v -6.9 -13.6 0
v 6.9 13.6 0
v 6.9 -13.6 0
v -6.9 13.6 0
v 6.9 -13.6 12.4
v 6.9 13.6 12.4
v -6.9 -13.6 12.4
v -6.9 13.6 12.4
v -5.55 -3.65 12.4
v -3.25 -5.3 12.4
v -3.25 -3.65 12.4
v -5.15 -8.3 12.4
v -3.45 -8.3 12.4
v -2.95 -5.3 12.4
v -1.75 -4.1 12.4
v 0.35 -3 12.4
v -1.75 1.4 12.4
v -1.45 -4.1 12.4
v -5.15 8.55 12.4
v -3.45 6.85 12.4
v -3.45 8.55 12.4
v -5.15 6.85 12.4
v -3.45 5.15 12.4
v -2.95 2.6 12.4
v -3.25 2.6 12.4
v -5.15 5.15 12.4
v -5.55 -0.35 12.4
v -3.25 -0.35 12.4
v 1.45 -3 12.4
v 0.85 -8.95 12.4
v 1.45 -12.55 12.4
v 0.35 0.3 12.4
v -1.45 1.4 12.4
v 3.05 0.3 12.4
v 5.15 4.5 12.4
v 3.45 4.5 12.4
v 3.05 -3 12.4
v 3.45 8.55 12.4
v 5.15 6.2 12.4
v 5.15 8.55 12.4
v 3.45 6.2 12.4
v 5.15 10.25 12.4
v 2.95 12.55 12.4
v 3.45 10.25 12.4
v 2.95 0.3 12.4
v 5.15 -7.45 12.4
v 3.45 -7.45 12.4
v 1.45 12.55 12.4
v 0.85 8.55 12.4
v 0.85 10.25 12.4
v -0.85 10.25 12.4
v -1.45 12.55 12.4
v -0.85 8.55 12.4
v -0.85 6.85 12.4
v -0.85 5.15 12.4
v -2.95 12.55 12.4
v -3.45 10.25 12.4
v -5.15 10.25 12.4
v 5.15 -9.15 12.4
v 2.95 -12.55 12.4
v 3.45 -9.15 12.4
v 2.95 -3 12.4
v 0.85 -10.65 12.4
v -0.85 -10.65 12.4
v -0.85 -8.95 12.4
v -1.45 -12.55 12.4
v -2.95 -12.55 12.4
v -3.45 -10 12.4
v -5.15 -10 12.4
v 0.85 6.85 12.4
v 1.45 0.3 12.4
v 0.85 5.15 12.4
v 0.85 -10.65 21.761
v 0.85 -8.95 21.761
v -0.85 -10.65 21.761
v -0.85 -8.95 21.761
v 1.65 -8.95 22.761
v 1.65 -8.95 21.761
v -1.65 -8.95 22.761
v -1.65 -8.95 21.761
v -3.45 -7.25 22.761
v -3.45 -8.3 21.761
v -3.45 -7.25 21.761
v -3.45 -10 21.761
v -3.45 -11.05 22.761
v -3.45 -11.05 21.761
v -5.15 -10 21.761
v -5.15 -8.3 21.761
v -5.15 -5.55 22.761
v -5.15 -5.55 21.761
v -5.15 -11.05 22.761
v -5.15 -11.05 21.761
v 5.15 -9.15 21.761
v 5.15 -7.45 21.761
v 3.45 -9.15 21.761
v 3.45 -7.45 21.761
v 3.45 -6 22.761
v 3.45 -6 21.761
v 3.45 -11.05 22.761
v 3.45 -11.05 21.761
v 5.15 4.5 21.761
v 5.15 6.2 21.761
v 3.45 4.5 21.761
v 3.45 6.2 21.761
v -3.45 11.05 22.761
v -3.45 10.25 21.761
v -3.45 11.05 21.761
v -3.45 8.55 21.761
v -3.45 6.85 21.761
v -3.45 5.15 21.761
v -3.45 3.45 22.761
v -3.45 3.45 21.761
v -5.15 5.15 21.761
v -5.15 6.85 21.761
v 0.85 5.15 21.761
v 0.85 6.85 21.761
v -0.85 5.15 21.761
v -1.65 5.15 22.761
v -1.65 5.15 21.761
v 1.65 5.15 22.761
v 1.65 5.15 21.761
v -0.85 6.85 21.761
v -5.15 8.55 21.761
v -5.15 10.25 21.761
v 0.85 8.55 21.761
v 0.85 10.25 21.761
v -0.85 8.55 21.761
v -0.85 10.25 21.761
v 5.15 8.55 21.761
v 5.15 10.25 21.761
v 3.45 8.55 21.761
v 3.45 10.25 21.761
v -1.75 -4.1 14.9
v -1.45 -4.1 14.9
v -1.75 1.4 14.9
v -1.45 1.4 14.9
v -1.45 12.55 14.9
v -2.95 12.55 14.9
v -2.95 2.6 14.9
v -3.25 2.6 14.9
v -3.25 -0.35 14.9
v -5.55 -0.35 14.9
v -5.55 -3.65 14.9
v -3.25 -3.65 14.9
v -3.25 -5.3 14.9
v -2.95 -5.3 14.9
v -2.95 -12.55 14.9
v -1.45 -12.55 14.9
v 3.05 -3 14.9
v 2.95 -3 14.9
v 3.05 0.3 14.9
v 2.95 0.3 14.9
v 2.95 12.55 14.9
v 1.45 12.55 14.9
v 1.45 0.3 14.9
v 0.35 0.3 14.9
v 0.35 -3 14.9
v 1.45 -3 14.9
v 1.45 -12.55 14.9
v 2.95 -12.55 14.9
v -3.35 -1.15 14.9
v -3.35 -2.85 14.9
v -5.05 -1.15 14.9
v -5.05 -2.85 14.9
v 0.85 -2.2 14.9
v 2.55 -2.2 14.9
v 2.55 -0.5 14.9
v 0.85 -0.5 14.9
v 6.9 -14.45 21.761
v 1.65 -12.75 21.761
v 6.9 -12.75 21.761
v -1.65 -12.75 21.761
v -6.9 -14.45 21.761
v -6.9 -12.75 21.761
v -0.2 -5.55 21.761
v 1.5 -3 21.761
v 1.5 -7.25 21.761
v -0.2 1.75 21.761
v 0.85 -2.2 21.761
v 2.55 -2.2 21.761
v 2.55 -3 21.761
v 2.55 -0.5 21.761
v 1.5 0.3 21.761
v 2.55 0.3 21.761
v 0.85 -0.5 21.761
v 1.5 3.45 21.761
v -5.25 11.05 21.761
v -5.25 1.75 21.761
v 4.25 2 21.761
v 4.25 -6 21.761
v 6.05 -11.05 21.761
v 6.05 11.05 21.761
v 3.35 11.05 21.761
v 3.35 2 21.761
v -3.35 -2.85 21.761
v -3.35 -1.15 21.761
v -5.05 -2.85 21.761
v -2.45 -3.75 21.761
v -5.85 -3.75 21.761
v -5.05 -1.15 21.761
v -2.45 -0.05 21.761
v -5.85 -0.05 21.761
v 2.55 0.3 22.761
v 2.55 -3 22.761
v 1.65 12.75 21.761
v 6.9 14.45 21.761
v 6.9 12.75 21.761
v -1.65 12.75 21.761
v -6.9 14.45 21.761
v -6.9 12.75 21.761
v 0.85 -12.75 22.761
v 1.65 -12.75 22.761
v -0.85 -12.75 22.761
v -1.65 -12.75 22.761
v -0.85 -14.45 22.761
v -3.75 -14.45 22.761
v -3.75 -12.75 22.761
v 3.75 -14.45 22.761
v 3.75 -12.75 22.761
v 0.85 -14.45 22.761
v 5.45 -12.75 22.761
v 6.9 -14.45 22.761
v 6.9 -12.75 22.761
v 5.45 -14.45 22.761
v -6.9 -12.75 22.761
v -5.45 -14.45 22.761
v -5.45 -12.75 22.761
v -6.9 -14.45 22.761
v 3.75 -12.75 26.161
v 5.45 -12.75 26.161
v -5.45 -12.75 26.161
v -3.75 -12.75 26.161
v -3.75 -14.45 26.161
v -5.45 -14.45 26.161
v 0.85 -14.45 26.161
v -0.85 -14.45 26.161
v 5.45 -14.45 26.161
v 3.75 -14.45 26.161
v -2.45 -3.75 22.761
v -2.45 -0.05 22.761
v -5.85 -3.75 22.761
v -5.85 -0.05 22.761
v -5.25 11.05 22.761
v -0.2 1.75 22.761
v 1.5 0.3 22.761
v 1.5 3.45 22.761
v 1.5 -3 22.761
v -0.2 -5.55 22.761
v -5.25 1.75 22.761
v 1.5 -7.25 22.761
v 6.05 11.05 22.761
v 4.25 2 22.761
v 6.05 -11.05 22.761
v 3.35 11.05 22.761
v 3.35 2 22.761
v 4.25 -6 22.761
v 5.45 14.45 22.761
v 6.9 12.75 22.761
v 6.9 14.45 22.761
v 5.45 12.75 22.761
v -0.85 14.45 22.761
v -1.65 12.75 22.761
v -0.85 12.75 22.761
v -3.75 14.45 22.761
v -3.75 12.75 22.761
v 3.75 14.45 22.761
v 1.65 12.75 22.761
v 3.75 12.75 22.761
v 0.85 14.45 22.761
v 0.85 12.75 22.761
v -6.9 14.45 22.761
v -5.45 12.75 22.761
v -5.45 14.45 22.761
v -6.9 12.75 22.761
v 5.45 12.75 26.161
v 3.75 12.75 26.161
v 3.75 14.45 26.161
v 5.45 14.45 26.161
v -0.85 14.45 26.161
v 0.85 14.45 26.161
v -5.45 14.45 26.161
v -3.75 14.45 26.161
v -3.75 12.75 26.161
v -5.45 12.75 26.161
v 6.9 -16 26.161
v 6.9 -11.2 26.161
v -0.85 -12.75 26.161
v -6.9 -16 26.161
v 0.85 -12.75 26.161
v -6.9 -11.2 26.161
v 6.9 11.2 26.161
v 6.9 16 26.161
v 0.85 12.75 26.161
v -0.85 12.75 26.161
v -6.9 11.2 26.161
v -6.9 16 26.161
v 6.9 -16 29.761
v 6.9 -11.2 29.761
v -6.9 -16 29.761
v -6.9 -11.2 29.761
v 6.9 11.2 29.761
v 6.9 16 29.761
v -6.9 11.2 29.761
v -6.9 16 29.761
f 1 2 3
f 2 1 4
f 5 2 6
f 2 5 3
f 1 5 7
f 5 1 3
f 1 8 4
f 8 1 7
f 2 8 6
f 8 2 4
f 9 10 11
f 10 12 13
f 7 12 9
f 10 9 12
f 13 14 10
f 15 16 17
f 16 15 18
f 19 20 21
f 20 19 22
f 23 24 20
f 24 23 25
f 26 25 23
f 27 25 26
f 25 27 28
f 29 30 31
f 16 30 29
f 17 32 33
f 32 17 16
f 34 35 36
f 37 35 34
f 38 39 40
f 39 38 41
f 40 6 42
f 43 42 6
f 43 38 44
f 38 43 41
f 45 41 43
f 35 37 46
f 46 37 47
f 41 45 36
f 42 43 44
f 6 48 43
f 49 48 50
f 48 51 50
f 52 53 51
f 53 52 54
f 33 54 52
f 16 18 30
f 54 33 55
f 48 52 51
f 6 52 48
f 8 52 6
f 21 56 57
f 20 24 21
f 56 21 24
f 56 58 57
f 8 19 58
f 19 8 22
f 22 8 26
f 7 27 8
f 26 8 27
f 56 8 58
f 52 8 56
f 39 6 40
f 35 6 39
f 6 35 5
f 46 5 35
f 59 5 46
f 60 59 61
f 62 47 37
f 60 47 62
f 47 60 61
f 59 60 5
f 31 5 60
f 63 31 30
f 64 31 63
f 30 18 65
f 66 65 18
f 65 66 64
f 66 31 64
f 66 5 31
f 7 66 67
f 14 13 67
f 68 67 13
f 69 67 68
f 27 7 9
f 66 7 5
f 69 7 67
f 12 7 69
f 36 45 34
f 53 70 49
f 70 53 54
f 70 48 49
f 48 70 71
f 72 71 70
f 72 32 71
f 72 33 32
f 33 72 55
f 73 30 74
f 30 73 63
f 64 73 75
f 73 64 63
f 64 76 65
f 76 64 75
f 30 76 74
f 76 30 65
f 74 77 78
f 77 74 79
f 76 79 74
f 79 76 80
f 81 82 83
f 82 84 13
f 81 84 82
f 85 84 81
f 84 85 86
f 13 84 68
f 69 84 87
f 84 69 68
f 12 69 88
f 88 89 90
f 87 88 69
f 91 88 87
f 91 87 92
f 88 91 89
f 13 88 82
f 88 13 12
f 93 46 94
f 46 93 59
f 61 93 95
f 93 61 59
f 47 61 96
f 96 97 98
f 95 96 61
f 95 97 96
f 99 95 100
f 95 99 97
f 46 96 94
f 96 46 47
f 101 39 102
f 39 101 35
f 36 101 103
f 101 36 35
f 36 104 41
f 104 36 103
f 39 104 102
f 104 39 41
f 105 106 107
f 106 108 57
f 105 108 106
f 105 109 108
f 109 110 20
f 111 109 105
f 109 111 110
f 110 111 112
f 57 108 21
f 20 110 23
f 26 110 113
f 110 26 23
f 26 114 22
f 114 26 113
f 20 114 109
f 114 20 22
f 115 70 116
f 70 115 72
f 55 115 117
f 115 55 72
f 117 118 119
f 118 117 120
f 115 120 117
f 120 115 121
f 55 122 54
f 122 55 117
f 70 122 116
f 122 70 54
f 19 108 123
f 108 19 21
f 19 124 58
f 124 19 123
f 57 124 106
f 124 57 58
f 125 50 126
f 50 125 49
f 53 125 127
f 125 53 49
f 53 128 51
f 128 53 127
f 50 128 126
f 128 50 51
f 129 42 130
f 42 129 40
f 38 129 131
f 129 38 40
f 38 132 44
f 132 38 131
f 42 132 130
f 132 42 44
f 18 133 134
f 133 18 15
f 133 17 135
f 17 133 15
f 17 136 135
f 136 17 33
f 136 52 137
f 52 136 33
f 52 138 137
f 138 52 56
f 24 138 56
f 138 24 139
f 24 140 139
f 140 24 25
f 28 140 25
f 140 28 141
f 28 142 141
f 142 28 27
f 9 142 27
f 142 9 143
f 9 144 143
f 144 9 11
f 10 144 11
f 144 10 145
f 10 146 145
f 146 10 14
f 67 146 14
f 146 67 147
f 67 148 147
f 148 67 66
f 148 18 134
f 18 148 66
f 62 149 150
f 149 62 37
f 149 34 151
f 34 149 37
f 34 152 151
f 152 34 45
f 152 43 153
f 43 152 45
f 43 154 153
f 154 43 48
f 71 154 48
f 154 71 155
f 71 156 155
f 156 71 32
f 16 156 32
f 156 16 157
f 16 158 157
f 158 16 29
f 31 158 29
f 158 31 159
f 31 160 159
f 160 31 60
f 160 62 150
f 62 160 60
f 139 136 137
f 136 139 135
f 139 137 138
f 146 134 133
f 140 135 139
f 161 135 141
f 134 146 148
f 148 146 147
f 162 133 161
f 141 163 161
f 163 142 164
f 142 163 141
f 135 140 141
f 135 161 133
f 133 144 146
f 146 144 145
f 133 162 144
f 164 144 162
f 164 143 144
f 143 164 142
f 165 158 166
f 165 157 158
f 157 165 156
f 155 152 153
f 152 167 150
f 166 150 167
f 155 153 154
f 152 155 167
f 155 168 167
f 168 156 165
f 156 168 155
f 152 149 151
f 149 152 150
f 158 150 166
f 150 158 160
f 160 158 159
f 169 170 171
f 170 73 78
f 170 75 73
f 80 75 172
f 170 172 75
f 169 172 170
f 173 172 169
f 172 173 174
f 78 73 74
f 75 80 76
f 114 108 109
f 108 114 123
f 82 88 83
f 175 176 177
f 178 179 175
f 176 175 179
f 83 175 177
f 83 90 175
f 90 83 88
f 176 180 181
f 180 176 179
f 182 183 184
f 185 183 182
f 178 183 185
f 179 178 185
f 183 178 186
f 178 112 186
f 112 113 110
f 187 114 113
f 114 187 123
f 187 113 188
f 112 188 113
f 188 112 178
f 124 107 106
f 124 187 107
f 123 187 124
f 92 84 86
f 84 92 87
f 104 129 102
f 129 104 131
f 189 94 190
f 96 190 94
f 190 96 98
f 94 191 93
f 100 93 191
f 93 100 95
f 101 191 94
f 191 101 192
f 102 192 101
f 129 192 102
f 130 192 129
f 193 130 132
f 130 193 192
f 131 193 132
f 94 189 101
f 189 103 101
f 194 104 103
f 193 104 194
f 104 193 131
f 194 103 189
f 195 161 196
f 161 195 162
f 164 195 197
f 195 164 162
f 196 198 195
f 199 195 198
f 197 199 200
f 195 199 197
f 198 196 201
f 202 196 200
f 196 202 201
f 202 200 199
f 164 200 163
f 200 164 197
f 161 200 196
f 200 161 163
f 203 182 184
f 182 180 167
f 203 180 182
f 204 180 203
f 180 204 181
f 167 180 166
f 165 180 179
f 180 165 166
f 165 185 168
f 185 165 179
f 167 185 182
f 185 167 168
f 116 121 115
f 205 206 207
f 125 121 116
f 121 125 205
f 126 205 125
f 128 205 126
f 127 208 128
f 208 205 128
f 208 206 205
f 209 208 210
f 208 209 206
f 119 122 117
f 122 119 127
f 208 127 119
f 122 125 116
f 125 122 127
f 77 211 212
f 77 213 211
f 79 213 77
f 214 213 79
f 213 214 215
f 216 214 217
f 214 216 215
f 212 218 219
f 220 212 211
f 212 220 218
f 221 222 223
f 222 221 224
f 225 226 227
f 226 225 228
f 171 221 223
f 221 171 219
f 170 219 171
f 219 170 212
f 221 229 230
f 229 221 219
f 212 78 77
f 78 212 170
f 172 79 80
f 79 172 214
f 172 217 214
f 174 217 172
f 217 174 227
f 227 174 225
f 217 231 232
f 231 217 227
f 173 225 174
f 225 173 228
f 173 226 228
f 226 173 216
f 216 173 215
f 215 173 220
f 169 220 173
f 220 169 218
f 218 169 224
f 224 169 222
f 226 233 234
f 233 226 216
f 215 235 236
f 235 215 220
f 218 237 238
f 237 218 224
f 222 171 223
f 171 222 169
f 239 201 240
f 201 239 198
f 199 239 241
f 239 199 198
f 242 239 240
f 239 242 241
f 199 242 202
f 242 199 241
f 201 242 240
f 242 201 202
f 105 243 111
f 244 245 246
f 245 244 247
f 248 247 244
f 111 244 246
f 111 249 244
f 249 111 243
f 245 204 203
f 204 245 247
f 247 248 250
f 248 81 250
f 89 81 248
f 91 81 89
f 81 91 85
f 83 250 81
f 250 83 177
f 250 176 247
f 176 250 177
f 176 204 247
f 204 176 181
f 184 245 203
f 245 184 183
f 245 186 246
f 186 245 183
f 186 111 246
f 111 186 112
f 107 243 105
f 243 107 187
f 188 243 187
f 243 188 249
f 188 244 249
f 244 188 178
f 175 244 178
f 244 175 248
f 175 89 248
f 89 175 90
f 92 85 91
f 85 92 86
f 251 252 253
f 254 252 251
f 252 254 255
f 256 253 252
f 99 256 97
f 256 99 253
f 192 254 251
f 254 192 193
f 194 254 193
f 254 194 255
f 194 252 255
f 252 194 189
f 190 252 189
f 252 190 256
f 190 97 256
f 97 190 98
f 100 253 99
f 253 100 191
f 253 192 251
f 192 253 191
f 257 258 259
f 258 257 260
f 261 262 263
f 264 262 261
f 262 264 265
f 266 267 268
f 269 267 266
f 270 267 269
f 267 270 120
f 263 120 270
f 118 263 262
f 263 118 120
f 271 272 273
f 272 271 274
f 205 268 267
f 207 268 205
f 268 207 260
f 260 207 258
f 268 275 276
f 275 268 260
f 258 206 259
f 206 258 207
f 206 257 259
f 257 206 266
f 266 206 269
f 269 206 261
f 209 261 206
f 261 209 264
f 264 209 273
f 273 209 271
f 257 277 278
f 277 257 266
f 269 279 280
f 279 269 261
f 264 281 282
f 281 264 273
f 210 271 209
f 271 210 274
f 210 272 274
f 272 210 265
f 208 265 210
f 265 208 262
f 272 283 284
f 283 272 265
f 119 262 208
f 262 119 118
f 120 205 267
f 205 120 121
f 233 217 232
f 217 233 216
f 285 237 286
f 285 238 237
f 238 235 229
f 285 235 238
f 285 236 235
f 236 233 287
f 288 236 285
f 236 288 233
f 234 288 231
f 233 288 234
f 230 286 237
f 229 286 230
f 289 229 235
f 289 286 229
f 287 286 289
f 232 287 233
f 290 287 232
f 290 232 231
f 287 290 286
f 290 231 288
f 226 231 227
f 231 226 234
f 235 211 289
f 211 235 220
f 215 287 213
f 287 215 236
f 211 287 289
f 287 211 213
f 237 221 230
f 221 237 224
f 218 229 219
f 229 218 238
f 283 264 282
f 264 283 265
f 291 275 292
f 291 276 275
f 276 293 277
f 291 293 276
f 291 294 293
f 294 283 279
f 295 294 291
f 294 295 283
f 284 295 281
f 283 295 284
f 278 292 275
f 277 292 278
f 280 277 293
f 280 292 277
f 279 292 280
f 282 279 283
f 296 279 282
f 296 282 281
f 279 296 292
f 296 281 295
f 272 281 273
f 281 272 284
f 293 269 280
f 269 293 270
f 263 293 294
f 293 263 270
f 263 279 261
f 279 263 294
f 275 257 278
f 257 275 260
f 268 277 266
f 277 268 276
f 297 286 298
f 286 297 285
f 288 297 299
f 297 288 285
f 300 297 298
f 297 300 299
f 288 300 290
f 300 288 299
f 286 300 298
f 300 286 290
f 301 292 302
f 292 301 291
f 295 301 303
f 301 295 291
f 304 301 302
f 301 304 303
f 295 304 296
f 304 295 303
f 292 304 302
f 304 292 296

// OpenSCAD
// Generated by SolidPython 0.4.2 on 2020-09-29 23:20:14
//!OpenSCAD

scale(v = 0.0100000000) {
	translate(v = [-690, -1360, 0]) {
		union() {
			color(c = [0.4000000000, 0.4000000000, 0.4000000000]) {
				translate(v = [0, 0, 0]) {
					linear_extrude(height = 1000.0000000000) {
						polygon(paths = [[0, 1, 2, 3]], points = [[0, 0], [0, 2720], [1380, 2720], [1380, 0]]);
					}
				}
			}
			color(c = [0.2000000000, 0.6000000000, 0.2000000000]) {
				translate(v = [0, 0, 1000.0000000000]) {
					linear_extrude(height = 120.0000000000) {
						polygon(paths = [[0, 1, 2, 3]], points = [[0, 1305], [0, 2720], [1380, 2720], [1380, 1305]]);
					}
				}
			}
			color(c = [0.4000000000, 0.4000000000, 0.4000000000]) {
				translate(v = [0, 0, 1000.0000000000]) {
					linear_extrude(height = 120.0000000000) {
						polygon(paths = [[0, 1, 2, 3]], points = [[0, 0], [0, 1305], [1380, 1305], [1380, 0]]);
					}
				}
			}
			color(c = [0.9000000000, 0.6000000000, 0.6000000000]) {
				translate(v = [0, 0, 1120.0000000000]) {
					linear_extrude(height = 120.0000000000) {
						polygon(paths = [[0, 1, 2, 3]], points = [[135, 1695], [135, 2485], [395, 2485], [395, 1695]]);
					}
				}
			}
			color(c = [0.9000000000, 0.6000000000, 0.6000000000]) {
				translate(v = [0, 0, 1120.0000000000]) {
					linear_extrude(height = 120.0000000000) {
						polygon(paths = [[0, 1, 2, 3]], points = [[545, 1695], [545, 2485], [835, 2485], [835, 1695]]);
					}
				}
			}
			color(c = [0.9000000000, 0.6000000000, 0.6000000000]) {
				translate(v = [0, 0, 1120.0000000000]) {
					linear_extrude(height = 120.0000000000) {
						polygon(paths = [[0, 1, 2, 3]], points = [[985, 1695], [985, 2485], [1245, 2485], [1245, 1695]]);
					}
				}
			}
			color(c = [0.9000000000, 0.6000000000, 0.9000000000]) {
				translate(v = [0, 0, 1120.0000000000]) {
					linear_extrude(height = 120.0000000000) {
						polygon(paths = [[0, 1, 2, 3]], points = [[135, 235], [135, 755], [395, 755], [395, 235]]);
					}
				}
			}
			color(c = [0.9000000000, 0.6000000000, 0.9000000000]) {
				translate(v = [0, 0, 1120.0000000000]) {
					linear_extrude(height = 120.0000000000) {
						polygon(paths = [[0, 1, 2, 3]], points = [[545, 235], [545, 755], [835, 755], [835, 235]]);
					}
				}
			}
			color(c = [0.9000000000, 0.6000000000, 0.9000000000]) {
				translate(v = [0, 0, 1120.0000000000]) {
					linear_extrude(height = 120.0000000000) {
						polygon(paths = [[0, 1, 2, 3]], points = [[985, 235], [985, 755], [1245, 755], [1245, 235]]);
					}
				}
			}
			color(c = [0.2000000000, 0.6000000000, 0.2000000000]) {
				translate(v = [0, 0, 1120.0000000000]) {
					linear_extrude(height = 120.0000000000) {
						difference() {
							polygon(paths = [[0, 1, 2, 3]], points = [[0, 1305], [0, 2720], [1380, 2720], [1380, 1305]]);
							polygon(paths = [[0, 1, 2, 3]], points = [[135, 1695], [395, 1695], [395, 2485], [135, 2485]]);
							polygon(paths = [[0, 1, 2, 3]], points = [[545, 1695], [835, 1695], [835, 2485], [545, 2485]]);
							polygon(paths = [[0, 1, 2, 3]], points = [[985, 1695], [1245, 1695], [1245, 2485], [985, 2485]]);
						}
					}
				}
			}
			color(c = [0.4000000000, 0.4000000000, 0.4000000000]) {
				translate(v = [0, 0, 1120.0000000000]) {
					linear_extrude(height = 120.0000000000) {
						difference() {
							polygon(paths = [[0, 1, 2, 3]], points = [[0, 0], [0, 1305], [1380, 1305], [1380, 0]]);
							polygon(paths = [[0, 1, 2, 3]], points = [[135, 235], [395, 235], [395, 755], [135, 755]]);
							polygon(paths = [[0, 1, 2, 3]], points = [[545, 235], [835, 235], [835, 755], [545, 755]]);
							polygon(paths = [[0, 1, 2, 3]], points = [[985, 235], [1245, 235], [1245, 755], [985, 755]]);
						}
					}
				}
			}
			color(c = [0.1000000000, 0.1000000000, 0.1000000000]) {
				translate(v = [0, 0, 1240.0000000000]) {
					linear_extrude(height = 70.0000000000) {
						polygon(paths = [[0, 1, 2, 3]], points = [[605, 295], [605, 465], [775, 465], [775, 295]]);
					}
				}
			}
			color(c = [0.1000000000, 0.1000000000, 0.1000000000]) {
				translate(v = [0, 0, 1240.0000000000]) {
					linear_extrude(height = 70.0000000000) {
						polygon(paths = [[0, 1, 2, 3]], points = [[175, 360], [175, 530], [345, 530], [345, 360]]);
					}
				}
			}
			color(c = [0.1000000000, 0.1000000000, 0.1000000000]) {
				translate(v = [0, 0, 1240.0000000000]) {
					linear_extrude(height = 70.0000000000) {
						polygon(paths = [[0, 1, 2, 3]], points = [[1035, 445], [1035, 615], [1205, 615], [1205, 445]]);
					}
				}
			}
			color(c = [0.1000000000, 0.1000000000, 0.1000000000]) {
				translate(v = [0, 0, 1240.0000000000]) {
					linear_extrude(height = 70.0000000000) {
						polygon(paths = [[0, 1, 2, 3]], points = [[1035, 1810], [1035, 1980], [1205, 1980], [1205, 1810]]);
					}
				}
			}
			color(c = [0.1000000000, 0.1000000000, 0.1000000000]) {
				translate(v = [0, 0, 1240.0000000000]) {
					linear_extrude(height = 70.0000000000) {
						polygon(paths = [[0, 1, 2, 3]], points = [[175, 1875], [175, 2045], [345, 2045], [345, 1875]]);
					}
				}
			}
			color(c = [0.1000000000, 0.1000000000, 0.1000000000]) {
				translate(v = [0, 0, 1240.0000000000]) {
					linear_extrude(height = 70.0000000000) {
						polygon(paths = [[0, 1, 2, 3]], points = [[605, 1875], [605, 2045], [775, 2045], [775, 1875]]);
					}
				}
			}
			color(c = [0.1000000000, 0.1000000000, 0.1000000000]) {
				translate(v = [0, 0, 1240.0000000000]) {
					linear_extrude(height = 70.0000000000) {
						polygon(paths = [[0, 1, 2, 3]], points = [[175, 2215], [175, 2385], [345, 2385], [345, 2215]]);
					}
				}
			}
			color(c = [0.1000000000, 0.1000000000, 0.1000000000]) {
				translate(v = [0, 0, 1240.0000000000]) {
					linear_extrude(height = 70.0000000000) {
						polygon(paths = [[0, 1, 2, 3]], points = [[605, 2215], [605, 2385], [775, 2385], [775, 2215]]);
					}
				}
			}
			color(c = [0.1000000000, 0.1000000000, 0.1000000000]) {
				translate(v = [0, 0, 1240.0000000000]) {
					linear_extrude(height = 70.0000000000) {
						polygon(paths = [[0, 1, 2, 3]], points = [[1035, 2215], [1035, 2385], [1205, 2385], [1205, 2215]]);
					}
				}
			}
			color(c = [1.0000000000, 1.0000000000, 1.0000000000]) {
				translate(v = [0, 0, 1240.0000000000]) {
					linear_extrude(height = 70.0000000000) {
						polygon(paths = [[0, 1, 2, 3, 4, 5, 6, 7, 8, 9, 10, 11, 12, 13, 14, 15]], points = [[395, 105], [395, 830], [365, 830], [365, 995], [135, 995], [135, 1325], [365, 1325], [365, 1620], [395, 1620], [395, 2615], [545, 2615], [545, 1500], [515, 1500], [515, 950], [545, 950], [545, 105]]);
					}
				}
			}
			color(c = [1.0000000000, 1.0000000000, 1.0000000000]) {
				translate(v = [0, 0, 1240.0000000000]) {
					linear_extrude(height = 70.0000000000) {
						polygon(paths = [[0, 1, 2, 3, 4, 5, 6, 7, 8, 9, 10, 11]], points = [[835, 105], [835, 1060], [725, 1060], [725, 1390], [835, 1390], [835, 2615], [985, 2615], [985, 1390], [995, 1390], [995, 1060], [985, 1060], [985, 105]]);
					}
				}
			}
			color(c = [0.1000000000, 0.1000000000, 0.1000000000]) {
				translate(v = [0, 0, 1310.0000000000]) {
					linear_extrude(height = 180.0000000000) {
						polygon(paths = [[0, 1, 2, 3]], points = [[605, 295], [605, 465], [775, 465], [775, 295]]);
					}
				}
			}
			color(c = [0.1000000000, 0.1000000000, 0.1000000000]) {
				translate(v = [0, 0, 1310.0000000000]) {
					linear_extrude(height = 180.0000000000) {
						polygon(paths = [[0, 1, 2, 3]], points = [[175, 360], [175, 530], [345, 530], [345, 360]]);
					}
				}
			}
			color(c = [0.1000000000, 0.1000000000, 0.1000000000]) {
				translate(v = [0, 0, 1310.0000000000]) {
					linear_extrude(height = 180.0000000000) {
						polygon(paths = [[0, 1, 2, 3]], points = [[1035, 445], [1035, 615], [1205, 615], [1205, 445]]);
					}
				}
			}
			color(c = [0.1000000000, 0.1000000000, 0.1000000000]) {
				translate(v = [0, 0, 1310.0000000000]) {
					linear_extrude(height = 180.0000000000) {
						polygon(paths = [[0, 1, 2, 3]], points = [[1035, 1810], [1035, 1980], [1205, 1980], [1205, 1810]]);
					}
				}
			}
			color(c = [0.1000000000, 0.1000000000, 0.1000000000]) {
				translate(v = [0, 0, 1310.0000000000]) {
					linear_extrude(height = 180.0000000000) {
						polygon(paths = [[0, 1, 2, 3]], points = [[175, 1875], [175, 2045], [345, 2045], [345, 1875]]);
					}
				}
			}
			color(c = [0.1000000000, 0.1000000000, 0.1000000000]) {
				translate(v = [0, 0, 1310.0000000000]) {
					linear_extrude(height = 180.0000000000) {
						polygon(paths = [[0, 1, 2, 3]], points = [[605, 1875], [605, 2045], [775, 2045], [775, 1875]]);
					}
				}
			}
			color(c = [0.1000000000, 0.1000000000, 0.1000000000]) {
				translate(v = [0, 0, 1310.0000000000]) {
					linear_extrude(height = 180.0000000000) {
						polygon(paths = [[0, 1, 2, 3]], points = [[175, 2215], [175, 2385], [345, 2385], [345, 2215]]);
					}
				}
			}
			color(c = [0.1000000000, 0.1000000000, 0.1000000000]) {
				translate(v = [0, 0, 1310.0000000000]) {
					linear_extrude(height = 180.0000000000) {
						polygon(paths = [[0, 1, 2, 3]], points = [[605, 2215], [605, 2385], [775, 2385], [775, 2215]]);
					}
				}
			}
			color(c = [0.1000000000, 0.1000000000, 0.1000000000]) {
				translate(v = [0, 0, 1310.0000000000]) {
					linear_extrude(height = 180.0000000000) {
						polygon(paths = [[0, 1, 2, 3]], points = [[1035, 2215], [1035, 2385], [1205, 2385], [1205, 2215]]);
					}
				}
			}
			color(c = [0.7000000000, 0, 0]) {
				translate(v = [0, 0, 1310.0000000000]) {
					linear_extrude(height = 180.0000000000) {
						polygon(paths = [[0, 1, 2, 3, 4, 5, 6, 7, 8, 9, 10, 11, 12, 13, 14, 15]], points = [[395, 105], [395, 830], [365, 830], [365, 995], [135, 995], [135, 1325], [365, 1325], [365, 1620], [395, 1620], [395, 2615], [545, 2615], [545, 1500], [515, 1500], [515, 950], [545, 950], [545, 105]]);
					}
				}
			}
			color(c = [0.7000000000, 0, 0]) {
				translate(v = [0, 0, 1310.0000000000]) {
					linear_extrude(height = 180.0000000000) {
						polygon(paths = [[0, 1, 2, 3, 4, 5, 6, 7, 8, 9, 10, 11]], points = [[835, 105], [835, 1060], [725, 1060], [725, 1390], [835, 1390], [835, 2615], [985, 2615], [985, 1390], [995, 1390], [995, 1060], [985, 1060], [985, 105]]);
					}
				}
			}
			color(c = [0.1000000000, 0.1000000000, 0.1000000000]) {
				translate(v = [0, 0, 1490.0000000000]) {
					linear_extrude(height = 686.1000000000) {
						polygon(paths = [[0, 1, 2, 3]], points = [[605, 295], [605, 465], [775, 465], [775, 295]]);
					}
				}
			}
			color(c = [0.1000000000, 0.1000000000, 0.1000000000]) {
				translate(v = [0, 0, 1490.0000000000]) {
					linear_extrude(height = 686.1000000000) {
						polygon(paths = [[0, 1, 2, 3]], points = [[175, 360], [175, 530], [345, 530], [345, 360]]);
					}
				}
			}
			color(c = [0.1000000000, 0.1000000000, 0.1000000000]) {
				translate(v = [0, 0, 1490.0000000000]) {
					linear_extrude(height = 686.1000000000) {
						polygon(paths = [[0, 1, 2, 3]], points = [[1035, 445], [1035, 615], [1205, 615], [1205, 445]]);
					}
				}
			}
			color(c = [0.1000000000, 0.1000000000, 0.1000000000]) {
				translate(v = [0, 0, 1490.0000000000]) {
					linear_extrude(height = 686.1000000000) {
						polygon(paths = [[0, 1, 2, 3]], points = [[185, 1075], [185, 1245], [355, 1245], [355, 1075]]);
					}
				}
			}
			color(c = [0.1000000000, 0.1000000000, 0.1000000000]) {
				translate(v = [0, 0, 1490.0000000000]) {
					linear_extrude(height = 686.1000000000) {
						polygon(paths = [[0, 1, 2, 3]], points = [[775, 1140], [775, 1310], [945, 1310], [945, 1140]]);
					}
				}
			}
			color(c = [0.1000000000, 0.1000000000, 0.1000000000]) {
				translate(v = [0, 0, 1490.0000000000]) {
					linear_extrude(height = 686.1000000000) {
						polygon(paths = [[0, 1, 2, 3]], points = [[1035, 1810], [1035, 1980], [1205, 1980], [1205, 1810]]);
					}
				}
			}
			color(c = [0.1000000000, 0.1000000000, 0.1000000000]) {
				translate(v = [0, 0, 1490.0000000000]) {
					linear_extrude(height = 686.1000000000) {
						polygon(paths = [[0, 1, 2, 3]], points = [[175, 1875], [175, 2045], [345, 2045], [345, 1875]]);
					}
				}
			}
			color(c = [0.1000000000, 0.1000000000, 0.1000000000]) {
				translate(v = [0, 0, 1490.0000000000]) {
					linear_extrude(height = 686.1000000000) {
						polygon(paths = [[0, 1, 2, 3]], points = [[605, 1875], [605, 2045], [775, 2045], [775, 1875]]);
					}
				}
			}
			color(c = [0.1000000000, 0.1000000000, 0.1000000000]) {
				translate(v = [0, 0, 1490.0000000000]) {
					linear_extrude(height = 686.1000000000) {
						polygon(paths = [[0, 1, 2, 3]], points = [[175, 2215], [175, 2385], [345, 2385], [345, 2215]]);
					}
				}
			}
			color(c = [0.1000000000, 0.1000000000, 0.1000000000]) {
				translate(v = [0, 0, 1490.0000000000]) {
					linear_extrude(height = 686.1000000000) {
						polygon(paths = [[0, 1, 2, 3]], points = [[605, 2215], [605, 2385], [775, 2385], [775, 2215]]);
					}
				}
			}
			color(c = [0.1000000000, 0.1000000000, 0.1000000000]) {
				translate(v = [0, 0, 1490.0000000000]) {
					linear_extrude(height = 686.1000000000) {
						polygon(paths = [[0, 1, 2, 3]], points = [[1035, 2215], [1035, 2385], [1205, 2385], [1205, 2215]]);
					}
				}
			}
			color(c = [0.9000000000, 0.6000000000, 0.6000000000]) {
				translate(v = [0, 0, 2176.1000000000]) {
					linear_extrude(height = 100.0000000000) {
						polygon(paths = [[0, 1, 2, 3, 4, 5, 6, 7]], points = [[0, -85], [0, 85], [525, 85], [525, 465], [855, 465], [855, 85], [1380, 85], [1380, -85]]);
					}
				}
			}
			color(c = [0.9000000000, 0.6000000000, 0.6000000000]) {
				translate(v = [0, 0, 2176.1000000000]) {
					linear_extrude(height = 100.0000000000) {
						polygon(paths = [[0, 1, 2, 3]], points = [[105, 985], [105, 1355], [445, 1355], [445, 985]]);
					}
				}
			}
			color(c = [0.9000000000, 0.6000000000, 0.6000000000]) {
				translate(v = [0, 0, 2176.1000000000]) {
					linear_extrude(height = 100.0000000000) {
						polygon(paths = [[0, 1, 2, 3, 4, 5, 6, 7, 8, 9, 10, 11, 12, 13, 14, 15]], points = [[175, 255], [175, 805], [670, 805], [670, 1535], [165, 1535], [165, 2465], [345, 2465], [345, 1705], [840, 1705], [840, 1390], [945, 1390], [945, 1060], [840, 1060], [840, 635], [345, 635], [345, 255]]);
					}
				}
			}
			color(c = [0.9000000000, 0.6000000000, 0.6000000000]) {
				translate(v = [0, 0, 2176.1000000000]) {
					linear_extrude(height = 100.0000000000) {
						polygon(paths = [[0, 1, 2, 3, 4, 5, 6, 7]], points = [[1035, 255], [1035, 760], [1115, 760], [1115, 1560], [1025, 1560], [1025, 2465], [1295, 2465], [1295, 255]]);
					}
				}
			}
			color(c = [0.9000000000, 0.6000000000, 0.6000000000]) {
				translate(v = [0, 0, 2176.1000000000]) {
					linear_extrude(height = 100.0000000000) {
						polygon(paths = [[0, 1, 2, 3, 4, 5, 6, 7]], points = [[525, 1875], [525, 2635], [0, 2635], [0, 2805], [1380, 2805], [1380, 2635], [855, 2635], [855, 1875]]);
					}
				}
			}
			color(c = [0.5000000000, 0.5000000000, 0.5000000000]) {
				translate(v = [0, 0, 2276.1000000000]) {
					linear_extrude(height = 340.0000000000) {
						polygon(paths = [[0, 1, 2, 3]], points = [[145, -85], [145, 85], [315, 85], [315, -85]]);
					}
				}
			}
			color(c = [0.5000000000, 0.5000000000, 0.5000000000]) {
				translate(v = [0, 0, 2276.1000000000]) {
					linear_extrude(height = 340.0000000000) {
						polygon(paths = [[0, 1, 2, 3]], points = [[605, -85], [605, 85], [775, 85], [775, -85]]);
					}
				}
			}
			color(c = [0.5000000000, 0.5000000000, 0.5000000000]) {
				translate(v = [0, 0, 2276.1000000000]) {
					linear_extrude(height = 340.0000000000) {
						polygon(paths = [[0, 1, 2, 3]], points = [[1065, -85], [1065, 85], [1235, 85], [1235, -85]]);
					}
				}
			}
			color(c = [0.5000000000, 0.5000000000, 0.5000000000]) {
				translate(v = [0, 0, 2276.1000000000]) {
					linear_extrude(height = 340.0000000000) {
						polygon(paths = [[0, 1, 2, 3]], points = [[145, 2635], [145, 2805], [315, 2805], [315, 2635]]);
					}
				}
			}
			color(c = [0.5000000000, 0.5000000000, 0.5000000000]) {
				translate(v = [0, 0, 2276.1000000000]) {
					linear_extrude(height = 340.0000000000) {
						polygon(paths = [[0, 1, 2, 3]], points = [[605, 2635], [605, 2805], [775, 2805], [775, 2635]]);
					}
				}
			}
			color(c = [0.5000000000, 0.5000000000, 0.5000000000]) {
				translate(v = [0, 0, 2276.1000000000]) {
					linear_extrude(height = 340.0000000000) {
						polygon(paths = [[0, 1, 2, 3]], points = [[1065, 2635], [1065, 2805], [1235, 2805], [1235, 2635]]);
					}
				}
			}
			color(c = [0.3000000000, 0.3000000000, 1]) {
				translate(v = [0, 0, 2616.1000000000]) {
					linear_extrude(height = 360.0000000000) {
						polygon(paths = [[0, 1, 2, 3]], points = [[0, -240], [0, 240], [1380, 240], [1380, -240]]);
					}
				}
			}
			color(c = [0.3000000000, 0.3000000000, 1]) {
				translate(v = [0, 0, 2616.1000000000]) {
					linear_extrude(height = 360.0000000000) {
						polygon(paths = [[0, 1, 2, 3]], points = [[0, 2480], [0, 2960], [1380, 2960], [1380, 2480]]);
					}
				}
			}
		}
	}
}
